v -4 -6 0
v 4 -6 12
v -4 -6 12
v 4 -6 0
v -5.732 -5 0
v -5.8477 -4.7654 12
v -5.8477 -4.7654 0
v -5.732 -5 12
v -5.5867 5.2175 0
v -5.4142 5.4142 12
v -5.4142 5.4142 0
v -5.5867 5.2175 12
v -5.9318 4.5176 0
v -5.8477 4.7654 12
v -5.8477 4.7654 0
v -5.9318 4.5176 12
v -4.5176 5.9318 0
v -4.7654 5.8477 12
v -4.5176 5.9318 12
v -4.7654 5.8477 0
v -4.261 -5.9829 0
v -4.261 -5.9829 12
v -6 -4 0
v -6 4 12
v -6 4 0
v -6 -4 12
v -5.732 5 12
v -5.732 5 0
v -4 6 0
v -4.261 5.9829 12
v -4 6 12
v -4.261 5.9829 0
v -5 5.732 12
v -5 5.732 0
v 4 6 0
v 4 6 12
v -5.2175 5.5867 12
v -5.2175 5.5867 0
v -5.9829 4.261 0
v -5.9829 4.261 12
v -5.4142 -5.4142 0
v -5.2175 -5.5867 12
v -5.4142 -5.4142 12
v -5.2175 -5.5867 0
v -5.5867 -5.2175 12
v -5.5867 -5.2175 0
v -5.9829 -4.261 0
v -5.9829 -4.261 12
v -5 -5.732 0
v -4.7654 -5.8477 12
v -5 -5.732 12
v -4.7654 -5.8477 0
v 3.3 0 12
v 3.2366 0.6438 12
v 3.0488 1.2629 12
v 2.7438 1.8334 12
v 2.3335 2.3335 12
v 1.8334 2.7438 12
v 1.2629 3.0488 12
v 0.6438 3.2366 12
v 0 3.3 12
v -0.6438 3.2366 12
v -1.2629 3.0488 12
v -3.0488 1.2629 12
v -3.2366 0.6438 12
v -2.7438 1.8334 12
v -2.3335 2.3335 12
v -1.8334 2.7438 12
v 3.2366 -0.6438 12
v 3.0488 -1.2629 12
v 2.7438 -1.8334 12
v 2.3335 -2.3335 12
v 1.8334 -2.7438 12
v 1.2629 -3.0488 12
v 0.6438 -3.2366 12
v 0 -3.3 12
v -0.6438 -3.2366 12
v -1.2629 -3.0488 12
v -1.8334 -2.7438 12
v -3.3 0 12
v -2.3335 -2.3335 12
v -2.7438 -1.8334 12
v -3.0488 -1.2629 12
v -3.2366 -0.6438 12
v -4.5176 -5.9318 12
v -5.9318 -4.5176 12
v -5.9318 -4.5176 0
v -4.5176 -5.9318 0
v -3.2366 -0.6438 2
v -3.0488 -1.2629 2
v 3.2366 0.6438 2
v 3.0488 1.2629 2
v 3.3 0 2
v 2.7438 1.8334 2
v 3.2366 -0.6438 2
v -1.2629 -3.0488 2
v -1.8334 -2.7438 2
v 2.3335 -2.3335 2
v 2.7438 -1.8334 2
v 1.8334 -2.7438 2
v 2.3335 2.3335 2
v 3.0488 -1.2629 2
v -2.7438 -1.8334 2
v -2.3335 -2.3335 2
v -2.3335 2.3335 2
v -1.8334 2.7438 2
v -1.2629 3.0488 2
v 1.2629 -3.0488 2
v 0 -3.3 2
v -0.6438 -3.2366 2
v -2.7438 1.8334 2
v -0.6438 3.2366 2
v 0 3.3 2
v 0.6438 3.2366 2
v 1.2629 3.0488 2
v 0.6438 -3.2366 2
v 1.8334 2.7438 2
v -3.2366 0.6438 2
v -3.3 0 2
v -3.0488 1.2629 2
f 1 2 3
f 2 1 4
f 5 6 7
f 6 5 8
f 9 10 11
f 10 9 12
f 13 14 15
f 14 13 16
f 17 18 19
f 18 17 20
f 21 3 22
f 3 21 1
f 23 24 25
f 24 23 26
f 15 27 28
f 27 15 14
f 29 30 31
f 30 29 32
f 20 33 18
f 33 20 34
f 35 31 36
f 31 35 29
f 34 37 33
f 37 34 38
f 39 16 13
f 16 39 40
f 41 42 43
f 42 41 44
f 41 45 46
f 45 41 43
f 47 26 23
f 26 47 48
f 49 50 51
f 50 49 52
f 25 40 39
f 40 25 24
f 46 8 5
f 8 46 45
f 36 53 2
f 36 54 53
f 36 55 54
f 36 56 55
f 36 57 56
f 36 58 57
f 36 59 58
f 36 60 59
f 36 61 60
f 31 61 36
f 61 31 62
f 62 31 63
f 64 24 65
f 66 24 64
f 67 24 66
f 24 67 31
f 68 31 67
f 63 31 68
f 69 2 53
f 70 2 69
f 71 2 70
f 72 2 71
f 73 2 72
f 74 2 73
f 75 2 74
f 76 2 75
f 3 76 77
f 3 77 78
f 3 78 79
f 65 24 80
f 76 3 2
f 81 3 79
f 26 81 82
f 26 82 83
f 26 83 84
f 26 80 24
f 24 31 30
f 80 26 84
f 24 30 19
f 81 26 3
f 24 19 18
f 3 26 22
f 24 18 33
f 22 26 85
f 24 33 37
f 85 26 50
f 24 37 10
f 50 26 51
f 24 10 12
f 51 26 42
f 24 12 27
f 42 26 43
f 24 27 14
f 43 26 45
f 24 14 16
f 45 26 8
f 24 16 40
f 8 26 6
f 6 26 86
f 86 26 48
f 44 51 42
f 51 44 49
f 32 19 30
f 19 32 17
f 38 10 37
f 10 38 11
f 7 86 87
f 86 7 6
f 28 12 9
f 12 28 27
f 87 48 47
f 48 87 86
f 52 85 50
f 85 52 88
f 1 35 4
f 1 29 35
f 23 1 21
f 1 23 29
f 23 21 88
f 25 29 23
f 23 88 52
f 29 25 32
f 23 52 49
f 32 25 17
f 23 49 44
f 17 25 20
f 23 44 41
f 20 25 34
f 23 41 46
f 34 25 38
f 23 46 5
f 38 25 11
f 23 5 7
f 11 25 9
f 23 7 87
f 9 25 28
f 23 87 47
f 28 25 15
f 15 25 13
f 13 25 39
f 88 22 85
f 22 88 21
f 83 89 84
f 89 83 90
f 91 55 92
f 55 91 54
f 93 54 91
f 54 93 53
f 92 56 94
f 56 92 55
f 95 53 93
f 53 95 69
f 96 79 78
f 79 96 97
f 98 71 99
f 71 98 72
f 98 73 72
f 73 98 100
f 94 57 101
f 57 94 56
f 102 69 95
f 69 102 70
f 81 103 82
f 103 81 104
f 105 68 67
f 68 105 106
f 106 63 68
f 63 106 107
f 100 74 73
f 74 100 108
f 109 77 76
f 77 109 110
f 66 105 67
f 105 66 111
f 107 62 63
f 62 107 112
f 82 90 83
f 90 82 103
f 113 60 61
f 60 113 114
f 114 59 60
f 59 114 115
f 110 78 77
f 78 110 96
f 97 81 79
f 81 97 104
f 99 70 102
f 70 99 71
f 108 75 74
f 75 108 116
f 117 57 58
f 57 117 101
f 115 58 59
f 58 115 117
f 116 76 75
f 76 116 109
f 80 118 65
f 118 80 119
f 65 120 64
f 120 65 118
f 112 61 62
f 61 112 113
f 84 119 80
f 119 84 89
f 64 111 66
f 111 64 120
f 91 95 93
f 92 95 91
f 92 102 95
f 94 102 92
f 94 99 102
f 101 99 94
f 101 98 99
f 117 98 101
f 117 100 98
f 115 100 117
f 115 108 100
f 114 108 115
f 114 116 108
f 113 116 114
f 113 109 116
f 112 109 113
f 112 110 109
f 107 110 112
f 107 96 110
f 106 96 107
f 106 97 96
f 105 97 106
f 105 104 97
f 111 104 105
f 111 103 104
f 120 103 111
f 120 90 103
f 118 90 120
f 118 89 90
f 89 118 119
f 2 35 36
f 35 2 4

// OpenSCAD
// file: ../params.scad
// LEGACY OpenSCAD — not maintained. Edit design/bed_params.json + Fusion builder instead.

// --- Printer envelope (Bambu P2S) ---
build_max = 256;
print_margin = 4;
print_limit = build_max - print_margin;

// --- Cell grid ---
grid_n = 3;
cell_pitch = 76;
wall_t = 3;
well_open = 58;
flange_seat = 64;
cassette_h = 18;
port_d = 6.5;

// --- Deck structure ---
deck_top_t = 4;
cavity_h = 32; // tube routing under cell deck (not electronics bay)
deck_rim = 8;
corner_r = 6;

// --- 370 micro pump (Taobao kit / photo vs Arduino; see docs/HARDWARE_DIMENSIONS.md) ---
pump_motor_d = 24.5;
pump_head_d = 31;
pump_axis_l = 68;
pump_nozzle_h = 8;
pump_port_od = 4.2;
pump_wire_tail = 35;
pump_count = 8; // set 6–8; layout skips extras above pump_count
pump_rows = 2;
pump_cols = 4;
pump_col_pitch = 36; // center distance along X
pump_row_pitch = 38; // center distance along Y
pump_cradle_z = 2; // floor of cradle above tray surface

// --- Solenoid (kit) ---
valve_l = 22;
valve_w = 12;
valve_h = 30;
valve_count = grid_n * grid_n;

// --- Arduino Uno + sensor shield (kit photo) ---
ctrl_board_l = 69;
ctrl_board_w = 54;
arduino_l = ctrl_board_l;
arduino_w = ctrl_board_w;
arduino_stack_h = 28;
arduino_standoff_h = 6;
arduino_usb_slot_w = 14;
arduino_usb_slot_h = 8;

// --- Closed electronics bay (pumps + Arduino, under service deck) ---
e_bay_x = 200;
e_bay_y = 128;
e_bay_cavity_h = 52;
e_bay_split_x = 100; // optional left/right print split at this X (local)
e_bay_tray_t = 4;
e_bay_rim_h = 8;

// Pump block placement inside bay (local coords, center = origin)
pump_block_w = (pump_cols - 1) * pump_col_pitch + pump_axis_l;
pump_block_h = (pump_rows - 1) * pump_row_pitch + pump_head_d;
pump_block_x0 = -pump_block_w / 2 - 8;
pump_block_y0 = -8;
arduino_pocket_x = e_bay_x / 2 - deck_rim - ctrl_board_l / 2 - 6;
arduino_pocket_y = -e_bay_y / 2 + deck_rim + ctrl_board_w / 2 + 6;

wire_gutter_d = 10;

// --- Service module (solid deck above electronics bay) ---
service_len = e_bay_y + deck_rim * 2;
service_deck_solid = true;

// --- Bottom / screw housing ---
panel_t = 4;
panel_screw_d = 3.4;
panel_screw_pitch = 35;
flange_screw_pitch = 40;
boss_od = 8;
split_flange_t = 10;

// --- Tube routing (cell deck) ---
// Each cell: one tube at bottom-center of well (not visible from top).
tube_od = 6;
tube_clip_id = tube_od + 0.6;
channel_w = tube_od + 4;
channel_depth = 8;
stem_pocket_d = channel_w; // barb + bend relief under well floor
stem_pocket_h = channel_depth + 4;

// --- Joint between deck sections ---
dowel_d = 5;
dowel_depth = 10;
lap_joint_screw_d = 3.4;

slip_fit = 0.25;
eps = 0.01;

function grid_span(n, pitch) = (n - 1) * pitch;
grid_xy = grid_span(grid_n, cell_pitch) + well_open + deck_rim * 2;
deck_cell_x = grid_xy;
deck_cell_y = grid_xy;
deck_service_x = max(deck_cell_x, e_bay_x + deck_rim * 2);
deck_service_y = service_len;
// file: ../lib/util.scad
include <../params.scad>

module rounded_rect_xy(x, y, r) {
  r2 = min(r, x / 2 - eps, y / 2 - eps);
  minkowski() {
    square([x - 2 * r2, y - 2 * r2], center = true);
    circle(r = r2, $fn = 48);
  }
}

module rounded_rect_3d(x, y, z, r) {
  linear_extrude(height = z, center = false, convexity = 4)
    rounded_rect_xy(x, y, r);
}

module well_cut(open_size, depth) {
  linear_extrude(height = depth + eps)
    rounded_rect_xy(open_size, open_size, corner_r - 1);
}

module port_hole(d = port_d) {
  cylinder(h = deck_top_t + cavity_h + panel_t + 2, d = d, center = false, $fn = 32);
}

// Bottom-center of cell well: through 4 mm floor into routing cavity (hidden from top).
module cell_bottom_port() {
  translate([0, 0, -eps])
    cylinder(h = deck_top_t + eps, d = port_d, $fn = 32);
}

module cell_stem_pocket(h = stem_pocket_h, d = stem_pocket_d) {
  translate([0, 0, -deck_top_t])
    cylinder(h = h, d = d, $fn = 32);
}

// Horizontal groove under deck (−Y toward service bay), centered on cell X.
module cell_run_to_service(run_len) {
  if (run_len > 2)
    translate([0, -run_len / 2, -deck_top_t - channel_depth / 2])
      cube([channel_w, run_len, channel_depth], center = true);
}

function service_foot_y(deck_y) = -deck_y / 2 + deck_rim;

function cell_run_len(cell_y, deck_y) = cell_y - service_foot_y(deck_y);

module cell_underdeck_plumbing(cell_y, deck_y) {
  cell_bottom_port();
  cell_stem_pocket();
  cell_run_to_service(cell_run_len(cell_y, deck_y));
}

module dowel_hole(depth = dowel_depth) {
  cylinder(h = depth + eps, d = dowel_d + slip_fit, $fn = 32);
}

module dowel_pin(h = dowel_depth) {
  cylinder(h = h, d = dowel_d - 0.05, $fn = 32);
}

// Route from cell center toward service bay (-Y direction)
module tube_channel(length, w = channel_w, d = channel_depth) {
  translate([0, -length / 2, -d])
    cube([w, length, d], center = true);
}

module tube_clip_body() {
  clip_w = 12;
  clip_h = channel_depth + 4;
  difference() {
    rounded_rect_3d(clip_w, clip_w, clip_h, 2);
    translate([0, 0, 2])
      cylinder(h = clip_h, d = tube_clip_id, $fn = 32);
    // snap slot
    translate([clip_w / 2 - 1, 0, clip_h / 2])
      cube([2, clip_w, clip_h], center = true);
  }
}
// main file
// Export: tube_clip.stl — print ~24
include <../lib/util.scad>

tube_clip_body();
